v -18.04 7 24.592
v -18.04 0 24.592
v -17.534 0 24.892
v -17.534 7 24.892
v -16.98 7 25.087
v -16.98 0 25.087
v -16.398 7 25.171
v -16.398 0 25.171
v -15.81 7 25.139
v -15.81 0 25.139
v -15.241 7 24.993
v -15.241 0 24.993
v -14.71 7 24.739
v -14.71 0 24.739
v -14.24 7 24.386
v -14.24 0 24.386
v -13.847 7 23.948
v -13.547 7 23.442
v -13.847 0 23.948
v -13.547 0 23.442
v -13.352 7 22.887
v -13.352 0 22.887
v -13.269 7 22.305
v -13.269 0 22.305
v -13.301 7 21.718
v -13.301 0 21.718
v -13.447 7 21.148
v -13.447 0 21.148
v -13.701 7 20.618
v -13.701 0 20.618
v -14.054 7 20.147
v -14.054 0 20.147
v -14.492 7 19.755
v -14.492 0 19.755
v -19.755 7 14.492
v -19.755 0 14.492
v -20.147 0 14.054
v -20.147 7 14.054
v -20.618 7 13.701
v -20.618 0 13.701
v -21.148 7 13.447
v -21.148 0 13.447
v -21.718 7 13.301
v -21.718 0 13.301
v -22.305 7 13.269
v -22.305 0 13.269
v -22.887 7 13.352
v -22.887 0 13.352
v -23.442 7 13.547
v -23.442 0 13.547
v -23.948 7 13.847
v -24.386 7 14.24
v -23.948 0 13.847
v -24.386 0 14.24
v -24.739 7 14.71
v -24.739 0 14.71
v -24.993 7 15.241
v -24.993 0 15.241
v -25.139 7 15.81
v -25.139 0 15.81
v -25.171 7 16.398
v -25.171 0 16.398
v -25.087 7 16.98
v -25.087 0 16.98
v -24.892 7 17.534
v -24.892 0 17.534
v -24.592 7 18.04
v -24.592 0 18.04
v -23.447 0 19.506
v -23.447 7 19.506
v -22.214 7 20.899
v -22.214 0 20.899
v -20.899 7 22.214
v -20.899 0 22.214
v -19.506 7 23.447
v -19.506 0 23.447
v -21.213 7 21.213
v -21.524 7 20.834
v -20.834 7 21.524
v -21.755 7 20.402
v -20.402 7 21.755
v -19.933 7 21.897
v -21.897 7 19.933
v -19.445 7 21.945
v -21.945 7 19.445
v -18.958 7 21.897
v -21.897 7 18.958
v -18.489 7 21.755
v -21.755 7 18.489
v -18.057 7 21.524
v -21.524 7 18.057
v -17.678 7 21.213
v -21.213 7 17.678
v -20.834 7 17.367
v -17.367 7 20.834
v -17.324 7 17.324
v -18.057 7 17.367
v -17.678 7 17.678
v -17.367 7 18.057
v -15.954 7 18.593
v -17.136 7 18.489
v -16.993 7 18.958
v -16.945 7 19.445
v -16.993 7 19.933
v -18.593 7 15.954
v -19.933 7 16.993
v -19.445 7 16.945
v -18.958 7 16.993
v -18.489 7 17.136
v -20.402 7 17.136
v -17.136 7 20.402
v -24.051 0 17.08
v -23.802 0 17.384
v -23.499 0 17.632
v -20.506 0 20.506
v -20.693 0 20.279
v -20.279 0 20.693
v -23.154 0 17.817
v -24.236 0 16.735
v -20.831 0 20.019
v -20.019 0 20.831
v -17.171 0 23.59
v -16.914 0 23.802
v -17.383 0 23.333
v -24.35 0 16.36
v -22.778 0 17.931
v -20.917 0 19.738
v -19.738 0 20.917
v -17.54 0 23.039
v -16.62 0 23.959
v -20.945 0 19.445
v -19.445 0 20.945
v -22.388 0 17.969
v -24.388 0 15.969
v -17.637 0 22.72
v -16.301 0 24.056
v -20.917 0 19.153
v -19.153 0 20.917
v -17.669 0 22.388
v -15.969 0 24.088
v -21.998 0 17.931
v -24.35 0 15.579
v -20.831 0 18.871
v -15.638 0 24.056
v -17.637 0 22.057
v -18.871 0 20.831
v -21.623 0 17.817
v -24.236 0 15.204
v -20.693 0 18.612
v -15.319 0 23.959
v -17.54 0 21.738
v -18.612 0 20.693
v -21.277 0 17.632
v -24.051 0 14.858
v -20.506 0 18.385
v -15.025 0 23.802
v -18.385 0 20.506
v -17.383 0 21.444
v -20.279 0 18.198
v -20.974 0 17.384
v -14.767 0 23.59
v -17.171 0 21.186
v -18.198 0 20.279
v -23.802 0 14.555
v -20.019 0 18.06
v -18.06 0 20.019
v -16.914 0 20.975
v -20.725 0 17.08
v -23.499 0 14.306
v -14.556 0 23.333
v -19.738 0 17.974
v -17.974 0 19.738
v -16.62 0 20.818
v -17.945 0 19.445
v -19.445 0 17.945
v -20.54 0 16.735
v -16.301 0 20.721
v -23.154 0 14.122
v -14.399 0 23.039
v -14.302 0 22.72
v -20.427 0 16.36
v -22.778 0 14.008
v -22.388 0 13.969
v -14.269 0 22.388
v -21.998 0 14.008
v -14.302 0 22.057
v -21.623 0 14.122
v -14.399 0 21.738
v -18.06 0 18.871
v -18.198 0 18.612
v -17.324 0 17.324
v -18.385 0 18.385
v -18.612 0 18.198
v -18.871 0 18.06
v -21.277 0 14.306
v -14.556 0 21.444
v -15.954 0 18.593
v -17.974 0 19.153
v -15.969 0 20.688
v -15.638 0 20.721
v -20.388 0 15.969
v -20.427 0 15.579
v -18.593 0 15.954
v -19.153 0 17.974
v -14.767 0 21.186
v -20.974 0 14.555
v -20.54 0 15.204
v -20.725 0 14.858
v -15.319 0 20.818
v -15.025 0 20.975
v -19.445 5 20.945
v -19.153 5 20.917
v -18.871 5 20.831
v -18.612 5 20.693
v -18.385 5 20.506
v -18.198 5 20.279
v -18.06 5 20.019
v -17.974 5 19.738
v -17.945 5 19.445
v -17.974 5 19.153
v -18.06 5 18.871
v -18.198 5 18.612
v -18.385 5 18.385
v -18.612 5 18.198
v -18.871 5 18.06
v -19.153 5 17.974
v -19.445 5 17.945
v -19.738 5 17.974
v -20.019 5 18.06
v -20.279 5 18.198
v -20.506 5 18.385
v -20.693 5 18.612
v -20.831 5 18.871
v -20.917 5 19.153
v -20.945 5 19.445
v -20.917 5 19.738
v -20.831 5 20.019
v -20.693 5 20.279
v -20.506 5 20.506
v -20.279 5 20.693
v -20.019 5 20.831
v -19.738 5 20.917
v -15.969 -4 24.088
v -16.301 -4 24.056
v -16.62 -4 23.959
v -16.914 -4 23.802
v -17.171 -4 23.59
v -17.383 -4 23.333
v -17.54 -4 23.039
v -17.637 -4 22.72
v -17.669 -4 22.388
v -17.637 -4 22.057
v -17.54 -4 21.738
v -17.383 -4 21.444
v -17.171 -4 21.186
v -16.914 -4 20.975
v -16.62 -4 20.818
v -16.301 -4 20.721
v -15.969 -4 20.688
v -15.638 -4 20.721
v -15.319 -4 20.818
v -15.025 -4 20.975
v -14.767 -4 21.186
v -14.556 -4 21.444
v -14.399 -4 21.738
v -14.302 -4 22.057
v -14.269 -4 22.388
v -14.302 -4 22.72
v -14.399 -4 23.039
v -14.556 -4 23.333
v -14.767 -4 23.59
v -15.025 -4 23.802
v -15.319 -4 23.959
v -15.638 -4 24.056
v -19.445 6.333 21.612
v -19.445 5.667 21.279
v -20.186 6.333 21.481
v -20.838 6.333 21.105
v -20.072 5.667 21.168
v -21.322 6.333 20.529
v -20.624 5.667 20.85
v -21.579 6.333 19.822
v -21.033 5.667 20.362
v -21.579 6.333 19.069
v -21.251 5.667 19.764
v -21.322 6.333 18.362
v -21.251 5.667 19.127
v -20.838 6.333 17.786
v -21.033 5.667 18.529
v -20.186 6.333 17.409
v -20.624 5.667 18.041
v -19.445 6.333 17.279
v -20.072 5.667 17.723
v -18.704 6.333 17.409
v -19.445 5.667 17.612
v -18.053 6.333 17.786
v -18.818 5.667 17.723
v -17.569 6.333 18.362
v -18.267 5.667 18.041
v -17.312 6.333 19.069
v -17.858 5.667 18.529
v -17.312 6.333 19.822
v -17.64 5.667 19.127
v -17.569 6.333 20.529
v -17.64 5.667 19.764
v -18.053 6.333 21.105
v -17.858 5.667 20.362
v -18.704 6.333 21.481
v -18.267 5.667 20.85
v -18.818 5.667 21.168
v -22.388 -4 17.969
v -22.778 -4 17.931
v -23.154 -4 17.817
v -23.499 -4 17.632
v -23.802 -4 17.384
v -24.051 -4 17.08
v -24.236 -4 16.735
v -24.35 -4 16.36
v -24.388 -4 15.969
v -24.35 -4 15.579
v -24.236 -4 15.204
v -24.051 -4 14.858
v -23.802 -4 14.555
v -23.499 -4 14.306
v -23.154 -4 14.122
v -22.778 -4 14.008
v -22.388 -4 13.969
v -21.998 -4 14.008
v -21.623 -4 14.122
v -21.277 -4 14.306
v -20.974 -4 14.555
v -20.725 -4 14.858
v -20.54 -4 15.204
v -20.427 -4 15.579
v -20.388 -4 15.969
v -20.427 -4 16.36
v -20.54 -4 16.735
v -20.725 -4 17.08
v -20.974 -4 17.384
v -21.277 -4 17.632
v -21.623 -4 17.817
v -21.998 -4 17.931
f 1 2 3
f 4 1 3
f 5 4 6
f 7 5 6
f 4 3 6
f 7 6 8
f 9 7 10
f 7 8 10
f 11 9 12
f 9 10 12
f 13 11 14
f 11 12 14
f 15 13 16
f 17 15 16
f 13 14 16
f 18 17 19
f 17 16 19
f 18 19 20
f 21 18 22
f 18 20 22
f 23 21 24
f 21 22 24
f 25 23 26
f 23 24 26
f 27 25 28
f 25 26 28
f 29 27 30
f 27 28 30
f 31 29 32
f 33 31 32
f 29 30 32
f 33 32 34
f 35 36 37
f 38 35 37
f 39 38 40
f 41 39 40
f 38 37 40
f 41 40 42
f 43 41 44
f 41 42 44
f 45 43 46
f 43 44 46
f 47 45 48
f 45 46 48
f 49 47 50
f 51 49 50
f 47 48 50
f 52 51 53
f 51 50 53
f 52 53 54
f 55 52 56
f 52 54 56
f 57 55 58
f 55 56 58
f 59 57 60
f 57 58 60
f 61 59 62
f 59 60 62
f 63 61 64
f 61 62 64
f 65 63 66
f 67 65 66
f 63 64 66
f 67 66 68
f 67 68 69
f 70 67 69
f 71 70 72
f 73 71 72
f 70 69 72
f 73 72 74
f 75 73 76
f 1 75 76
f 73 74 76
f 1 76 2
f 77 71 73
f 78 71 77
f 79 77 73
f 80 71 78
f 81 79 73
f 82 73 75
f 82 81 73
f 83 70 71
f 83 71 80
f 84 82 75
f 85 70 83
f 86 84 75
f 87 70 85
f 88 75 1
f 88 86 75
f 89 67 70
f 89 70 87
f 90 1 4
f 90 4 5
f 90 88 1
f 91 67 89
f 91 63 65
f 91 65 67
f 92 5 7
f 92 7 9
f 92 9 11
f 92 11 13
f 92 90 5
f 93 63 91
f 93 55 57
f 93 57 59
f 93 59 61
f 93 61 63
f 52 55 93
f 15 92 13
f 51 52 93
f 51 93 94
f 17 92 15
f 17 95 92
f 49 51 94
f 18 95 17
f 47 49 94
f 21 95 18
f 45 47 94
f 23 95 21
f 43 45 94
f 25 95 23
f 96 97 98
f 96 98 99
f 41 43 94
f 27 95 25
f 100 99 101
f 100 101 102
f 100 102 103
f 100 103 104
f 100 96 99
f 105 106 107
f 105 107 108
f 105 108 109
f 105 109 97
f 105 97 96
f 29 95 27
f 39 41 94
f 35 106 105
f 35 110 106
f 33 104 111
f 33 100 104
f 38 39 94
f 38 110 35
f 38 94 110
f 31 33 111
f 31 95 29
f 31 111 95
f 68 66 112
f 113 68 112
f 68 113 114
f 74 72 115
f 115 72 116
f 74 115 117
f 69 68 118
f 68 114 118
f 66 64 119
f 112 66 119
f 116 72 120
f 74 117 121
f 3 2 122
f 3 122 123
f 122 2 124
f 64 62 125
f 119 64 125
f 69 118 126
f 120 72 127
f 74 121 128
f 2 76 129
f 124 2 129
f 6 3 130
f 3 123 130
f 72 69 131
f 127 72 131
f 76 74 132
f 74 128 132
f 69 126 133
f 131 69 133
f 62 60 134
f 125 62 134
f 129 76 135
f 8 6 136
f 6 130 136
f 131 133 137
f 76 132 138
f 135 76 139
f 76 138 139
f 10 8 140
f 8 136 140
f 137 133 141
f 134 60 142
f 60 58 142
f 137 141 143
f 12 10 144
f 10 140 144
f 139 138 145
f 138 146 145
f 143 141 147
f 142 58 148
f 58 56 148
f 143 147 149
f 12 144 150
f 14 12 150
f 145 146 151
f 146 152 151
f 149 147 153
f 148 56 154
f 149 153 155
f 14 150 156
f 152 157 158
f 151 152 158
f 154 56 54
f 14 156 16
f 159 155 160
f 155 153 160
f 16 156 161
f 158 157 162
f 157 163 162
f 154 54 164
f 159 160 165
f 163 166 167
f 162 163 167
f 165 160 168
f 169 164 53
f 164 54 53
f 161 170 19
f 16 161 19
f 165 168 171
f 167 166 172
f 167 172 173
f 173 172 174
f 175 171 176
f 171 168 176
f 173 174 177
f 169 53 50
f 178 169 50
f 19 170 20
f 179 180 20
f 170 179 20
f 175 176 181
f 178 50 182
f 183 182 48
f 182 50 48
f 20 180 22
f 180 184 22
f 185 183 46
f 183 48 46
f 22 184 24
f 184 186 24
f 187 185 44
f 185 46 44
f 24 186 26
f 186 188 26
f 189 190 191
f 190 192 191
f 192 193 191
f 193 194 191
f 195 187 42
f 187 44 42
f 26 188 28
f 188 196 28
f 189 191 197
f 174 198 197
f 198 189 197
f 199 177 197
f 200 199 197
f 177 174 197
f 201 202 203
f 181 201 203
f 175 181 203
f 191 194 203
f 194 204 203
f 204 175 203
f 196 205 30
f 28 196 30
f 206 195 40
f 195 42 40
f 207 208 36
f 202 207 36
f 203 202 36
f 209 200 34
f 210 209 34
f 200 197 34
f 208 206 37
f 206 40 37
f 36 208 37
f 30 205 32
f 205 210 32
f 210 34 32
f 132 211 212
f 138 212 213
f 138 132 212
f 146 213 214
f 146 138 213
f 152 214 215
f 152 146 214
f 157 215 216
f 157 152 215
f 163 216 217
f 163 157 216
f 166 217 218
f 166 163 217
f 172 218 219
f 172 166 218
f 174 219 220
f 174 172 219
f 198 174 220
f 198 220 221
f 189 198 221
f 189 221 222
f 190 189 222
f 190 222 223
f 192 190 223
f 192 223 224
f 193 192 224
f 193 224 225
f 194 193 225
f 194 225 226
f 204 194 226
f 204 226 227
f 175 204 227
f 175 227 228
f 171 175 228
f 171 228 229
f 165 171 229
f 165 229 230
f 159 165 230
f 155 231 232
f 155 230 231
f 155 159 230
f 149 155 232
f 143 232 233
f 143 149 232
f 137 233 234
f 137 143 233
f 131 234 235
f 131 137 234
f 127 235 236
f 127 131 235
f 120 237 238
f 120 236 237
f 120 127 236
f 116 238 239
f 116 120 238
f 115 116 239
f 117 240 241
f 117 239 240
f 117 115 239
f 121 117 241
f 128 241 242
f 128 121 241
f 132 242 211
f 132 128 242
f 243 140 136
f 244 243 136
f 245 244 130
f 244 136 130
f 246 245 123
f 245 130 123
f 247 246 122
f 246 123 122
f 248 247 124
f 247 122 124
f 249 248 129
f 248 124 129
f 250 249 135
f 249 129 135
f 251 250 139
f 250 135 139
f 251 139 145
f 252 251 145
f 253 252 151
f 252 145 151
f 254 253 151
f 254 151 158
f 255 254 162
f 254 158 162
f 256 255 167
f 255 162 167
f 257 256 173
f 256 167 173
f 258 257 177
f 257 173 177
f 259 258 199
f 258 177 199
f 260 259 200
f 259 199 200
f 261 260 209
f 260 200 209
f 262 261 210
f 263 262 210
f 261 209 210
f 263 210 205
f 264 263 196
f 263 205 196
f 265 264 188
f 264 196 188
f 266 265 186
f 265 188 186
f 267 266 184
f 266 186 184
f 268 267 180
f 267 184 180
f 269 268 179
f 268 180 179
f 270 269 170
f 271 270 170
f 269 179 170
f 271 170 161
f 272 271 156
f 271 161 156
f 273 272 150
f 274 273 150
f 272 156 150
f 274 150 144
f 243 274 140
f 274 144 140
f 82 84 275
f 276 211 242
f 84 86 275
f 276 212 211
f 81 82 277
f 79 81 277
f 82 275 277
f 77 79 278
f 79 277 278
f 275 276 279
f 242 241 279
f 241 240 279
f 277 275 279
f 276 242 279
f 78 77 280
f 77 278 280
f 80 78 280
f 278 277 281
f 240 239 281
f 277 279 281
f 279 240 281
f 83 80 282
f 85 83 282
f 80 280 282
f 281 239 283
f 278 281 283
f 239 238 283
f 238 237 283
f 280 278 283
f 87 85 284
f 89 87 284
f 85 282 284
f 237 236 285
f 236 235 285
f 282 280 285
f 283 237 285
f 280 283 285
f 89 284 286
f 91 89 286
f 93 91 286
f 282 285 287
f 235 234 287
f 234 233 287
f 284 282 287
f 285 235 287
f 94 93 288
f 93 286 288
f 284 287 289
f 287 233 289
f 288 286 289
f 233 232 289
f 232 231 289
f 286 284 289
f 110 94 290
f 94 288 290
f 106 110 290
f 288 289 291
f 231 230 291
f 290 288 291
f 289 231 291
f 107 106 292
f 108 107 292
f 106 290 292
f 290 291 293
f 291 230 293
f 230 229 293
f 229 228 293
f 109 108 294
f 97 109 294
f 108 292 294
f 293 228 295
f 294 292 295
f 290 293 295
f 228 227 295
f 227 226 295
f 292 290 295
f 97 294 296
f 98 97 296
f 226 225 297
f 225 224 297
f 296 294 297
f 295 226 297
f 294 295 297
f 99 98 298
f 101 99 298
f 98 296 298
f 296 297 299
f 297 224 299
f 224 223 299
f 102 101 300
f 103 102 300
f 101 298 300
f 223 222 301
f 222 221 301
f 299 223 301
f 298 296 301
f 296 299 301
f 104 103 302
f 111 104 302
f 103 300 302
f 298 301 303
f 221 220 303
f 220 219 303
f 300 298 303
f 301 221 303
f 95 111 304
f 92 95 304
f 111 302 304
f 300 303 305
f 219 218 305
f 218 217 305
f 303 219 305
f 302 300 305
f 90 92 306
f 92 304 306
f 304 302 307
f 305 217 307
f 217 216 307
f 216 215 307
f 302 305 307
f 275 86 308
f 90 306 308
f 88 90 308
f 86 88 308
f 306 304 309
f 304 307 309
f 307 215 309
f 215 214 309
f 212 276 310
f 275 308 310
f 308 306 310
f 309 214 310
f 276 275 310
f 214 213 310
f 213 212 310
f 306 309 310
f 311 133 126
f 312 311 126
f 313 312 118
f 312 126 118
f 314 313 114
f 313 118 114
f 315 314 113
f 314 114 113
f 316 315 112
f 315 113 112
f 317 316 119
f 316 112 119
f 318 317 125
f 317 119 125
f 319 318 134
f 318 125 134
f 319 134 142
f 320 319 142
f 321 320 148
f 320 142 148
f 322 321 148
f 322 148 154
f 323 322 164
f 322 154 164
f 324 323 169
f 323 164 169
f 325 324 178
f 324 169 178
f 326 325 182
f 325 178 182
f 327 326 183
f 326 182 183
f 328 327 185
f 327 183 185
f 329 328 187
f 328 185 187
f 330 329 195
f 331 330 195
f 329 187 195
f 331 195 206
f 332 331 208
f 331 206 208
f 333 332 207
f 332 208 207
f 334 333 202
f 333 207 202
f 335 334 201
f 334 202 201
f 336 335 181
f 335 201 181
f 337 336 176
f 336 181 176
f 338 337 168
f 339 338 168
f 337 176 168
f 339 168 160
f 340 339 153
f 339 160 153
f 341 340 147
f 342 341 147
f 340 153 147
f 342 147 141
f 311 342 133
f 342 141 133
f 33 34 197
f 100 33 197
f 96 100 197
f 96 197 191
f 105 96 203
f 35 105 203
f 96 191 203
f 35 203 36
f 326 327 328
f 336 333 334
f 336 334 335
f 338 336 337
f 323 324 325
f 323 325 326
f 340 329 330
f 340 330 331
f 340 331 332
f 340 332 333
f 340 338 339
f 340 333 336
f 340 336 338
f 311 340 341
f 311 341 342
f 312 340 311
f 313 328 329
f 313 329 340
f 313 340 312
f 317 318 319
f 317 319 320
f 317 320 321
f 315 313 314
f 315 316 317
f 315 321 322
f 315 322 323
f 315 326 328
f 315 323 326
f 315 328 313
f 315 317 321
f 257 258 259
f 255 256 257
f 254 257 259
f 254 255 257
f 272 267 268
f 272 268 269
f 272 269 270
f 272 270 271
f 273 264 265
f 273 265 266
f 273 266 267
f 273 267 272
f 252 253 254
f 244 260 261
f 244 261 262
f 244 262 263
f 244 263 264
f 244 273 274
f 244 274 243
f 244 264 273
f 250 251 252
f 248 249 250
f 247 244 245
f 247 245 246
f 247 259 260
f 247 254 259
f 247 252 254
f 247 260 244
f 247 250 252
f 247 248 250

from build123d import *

# Parameters (mm, degrees)
SKETCH_1_R      = 1.5
EXTRUDE_1_DEPTH = 7
SKETCH_3_R      = 1.7
SKETCH_3_R_2    = 2
EXTRUDE_2_DEPTH = 4


with BuildPart() as part:
    # 草图1 → 凸台-拉伸1 (new body)
    with BuildSketch(Plane(origin=(0, 0, 0), x_dir=(1, 0, 0), z_dir=(0, 1, 0))):
        with BuildLine():
            ThreePointArc((-24.592495152, -18.040487305), (-21.566756826, -21.566756826), (-18.040487305, -24.592495152))
            ThreePointArc((-18.040487305, -24.592495152), (-13.847079195, -23.948035364), (-14.491538983, -19.754627253))
            ThreePointArc((-14.491538983, -19.754627253), (-17.324116139, -17.324116139), (-19.754627253, -14.491538983))
            ThreePointArc((-19.754627253, -14.491538983), (-23.948035364, -13.847079195), (-24.592495152, -18.040487305))
        make_face()
        with Locations((-19.445436483, -19.445436483)):
            Circle(SKETCH_1_R, mode=Mode.SUBTRACT)
    extrude(amount=EXTRUDE_1_DEPTH)

    # 草图2 → 切除-旋转1 (revolve, cut)
    with BuildSketch(Plane(origin=(-19.445436483, 0, 0), x_dir=(0, 0, -1), z_dir=(1, 0, 0))):
        Polygon((-19.445436483, 7), (-21.945436483, 7), (-20.695436483, 4.5), (-19.445436483, 4.5), align=None)
    revolve(axis=Axis((-19.445436483, 7, 19.445436483), (0, -1, 0)), mode=Mode.SUBTRACT)

    # 草图3 → 凸台-拉伸2 (add)
    with BuildSketch(Plane.XZ):
        with Locations((-15.969331282, 22.388176755)):
            Circle(SKETCH_3_R)
        with Locations((-22.388176755, 15.969331282)):
            Circle(SKETCH_3_R_2)
    extrude(amount=EXTRUDE_2_DEPTH)


solid = part.part
